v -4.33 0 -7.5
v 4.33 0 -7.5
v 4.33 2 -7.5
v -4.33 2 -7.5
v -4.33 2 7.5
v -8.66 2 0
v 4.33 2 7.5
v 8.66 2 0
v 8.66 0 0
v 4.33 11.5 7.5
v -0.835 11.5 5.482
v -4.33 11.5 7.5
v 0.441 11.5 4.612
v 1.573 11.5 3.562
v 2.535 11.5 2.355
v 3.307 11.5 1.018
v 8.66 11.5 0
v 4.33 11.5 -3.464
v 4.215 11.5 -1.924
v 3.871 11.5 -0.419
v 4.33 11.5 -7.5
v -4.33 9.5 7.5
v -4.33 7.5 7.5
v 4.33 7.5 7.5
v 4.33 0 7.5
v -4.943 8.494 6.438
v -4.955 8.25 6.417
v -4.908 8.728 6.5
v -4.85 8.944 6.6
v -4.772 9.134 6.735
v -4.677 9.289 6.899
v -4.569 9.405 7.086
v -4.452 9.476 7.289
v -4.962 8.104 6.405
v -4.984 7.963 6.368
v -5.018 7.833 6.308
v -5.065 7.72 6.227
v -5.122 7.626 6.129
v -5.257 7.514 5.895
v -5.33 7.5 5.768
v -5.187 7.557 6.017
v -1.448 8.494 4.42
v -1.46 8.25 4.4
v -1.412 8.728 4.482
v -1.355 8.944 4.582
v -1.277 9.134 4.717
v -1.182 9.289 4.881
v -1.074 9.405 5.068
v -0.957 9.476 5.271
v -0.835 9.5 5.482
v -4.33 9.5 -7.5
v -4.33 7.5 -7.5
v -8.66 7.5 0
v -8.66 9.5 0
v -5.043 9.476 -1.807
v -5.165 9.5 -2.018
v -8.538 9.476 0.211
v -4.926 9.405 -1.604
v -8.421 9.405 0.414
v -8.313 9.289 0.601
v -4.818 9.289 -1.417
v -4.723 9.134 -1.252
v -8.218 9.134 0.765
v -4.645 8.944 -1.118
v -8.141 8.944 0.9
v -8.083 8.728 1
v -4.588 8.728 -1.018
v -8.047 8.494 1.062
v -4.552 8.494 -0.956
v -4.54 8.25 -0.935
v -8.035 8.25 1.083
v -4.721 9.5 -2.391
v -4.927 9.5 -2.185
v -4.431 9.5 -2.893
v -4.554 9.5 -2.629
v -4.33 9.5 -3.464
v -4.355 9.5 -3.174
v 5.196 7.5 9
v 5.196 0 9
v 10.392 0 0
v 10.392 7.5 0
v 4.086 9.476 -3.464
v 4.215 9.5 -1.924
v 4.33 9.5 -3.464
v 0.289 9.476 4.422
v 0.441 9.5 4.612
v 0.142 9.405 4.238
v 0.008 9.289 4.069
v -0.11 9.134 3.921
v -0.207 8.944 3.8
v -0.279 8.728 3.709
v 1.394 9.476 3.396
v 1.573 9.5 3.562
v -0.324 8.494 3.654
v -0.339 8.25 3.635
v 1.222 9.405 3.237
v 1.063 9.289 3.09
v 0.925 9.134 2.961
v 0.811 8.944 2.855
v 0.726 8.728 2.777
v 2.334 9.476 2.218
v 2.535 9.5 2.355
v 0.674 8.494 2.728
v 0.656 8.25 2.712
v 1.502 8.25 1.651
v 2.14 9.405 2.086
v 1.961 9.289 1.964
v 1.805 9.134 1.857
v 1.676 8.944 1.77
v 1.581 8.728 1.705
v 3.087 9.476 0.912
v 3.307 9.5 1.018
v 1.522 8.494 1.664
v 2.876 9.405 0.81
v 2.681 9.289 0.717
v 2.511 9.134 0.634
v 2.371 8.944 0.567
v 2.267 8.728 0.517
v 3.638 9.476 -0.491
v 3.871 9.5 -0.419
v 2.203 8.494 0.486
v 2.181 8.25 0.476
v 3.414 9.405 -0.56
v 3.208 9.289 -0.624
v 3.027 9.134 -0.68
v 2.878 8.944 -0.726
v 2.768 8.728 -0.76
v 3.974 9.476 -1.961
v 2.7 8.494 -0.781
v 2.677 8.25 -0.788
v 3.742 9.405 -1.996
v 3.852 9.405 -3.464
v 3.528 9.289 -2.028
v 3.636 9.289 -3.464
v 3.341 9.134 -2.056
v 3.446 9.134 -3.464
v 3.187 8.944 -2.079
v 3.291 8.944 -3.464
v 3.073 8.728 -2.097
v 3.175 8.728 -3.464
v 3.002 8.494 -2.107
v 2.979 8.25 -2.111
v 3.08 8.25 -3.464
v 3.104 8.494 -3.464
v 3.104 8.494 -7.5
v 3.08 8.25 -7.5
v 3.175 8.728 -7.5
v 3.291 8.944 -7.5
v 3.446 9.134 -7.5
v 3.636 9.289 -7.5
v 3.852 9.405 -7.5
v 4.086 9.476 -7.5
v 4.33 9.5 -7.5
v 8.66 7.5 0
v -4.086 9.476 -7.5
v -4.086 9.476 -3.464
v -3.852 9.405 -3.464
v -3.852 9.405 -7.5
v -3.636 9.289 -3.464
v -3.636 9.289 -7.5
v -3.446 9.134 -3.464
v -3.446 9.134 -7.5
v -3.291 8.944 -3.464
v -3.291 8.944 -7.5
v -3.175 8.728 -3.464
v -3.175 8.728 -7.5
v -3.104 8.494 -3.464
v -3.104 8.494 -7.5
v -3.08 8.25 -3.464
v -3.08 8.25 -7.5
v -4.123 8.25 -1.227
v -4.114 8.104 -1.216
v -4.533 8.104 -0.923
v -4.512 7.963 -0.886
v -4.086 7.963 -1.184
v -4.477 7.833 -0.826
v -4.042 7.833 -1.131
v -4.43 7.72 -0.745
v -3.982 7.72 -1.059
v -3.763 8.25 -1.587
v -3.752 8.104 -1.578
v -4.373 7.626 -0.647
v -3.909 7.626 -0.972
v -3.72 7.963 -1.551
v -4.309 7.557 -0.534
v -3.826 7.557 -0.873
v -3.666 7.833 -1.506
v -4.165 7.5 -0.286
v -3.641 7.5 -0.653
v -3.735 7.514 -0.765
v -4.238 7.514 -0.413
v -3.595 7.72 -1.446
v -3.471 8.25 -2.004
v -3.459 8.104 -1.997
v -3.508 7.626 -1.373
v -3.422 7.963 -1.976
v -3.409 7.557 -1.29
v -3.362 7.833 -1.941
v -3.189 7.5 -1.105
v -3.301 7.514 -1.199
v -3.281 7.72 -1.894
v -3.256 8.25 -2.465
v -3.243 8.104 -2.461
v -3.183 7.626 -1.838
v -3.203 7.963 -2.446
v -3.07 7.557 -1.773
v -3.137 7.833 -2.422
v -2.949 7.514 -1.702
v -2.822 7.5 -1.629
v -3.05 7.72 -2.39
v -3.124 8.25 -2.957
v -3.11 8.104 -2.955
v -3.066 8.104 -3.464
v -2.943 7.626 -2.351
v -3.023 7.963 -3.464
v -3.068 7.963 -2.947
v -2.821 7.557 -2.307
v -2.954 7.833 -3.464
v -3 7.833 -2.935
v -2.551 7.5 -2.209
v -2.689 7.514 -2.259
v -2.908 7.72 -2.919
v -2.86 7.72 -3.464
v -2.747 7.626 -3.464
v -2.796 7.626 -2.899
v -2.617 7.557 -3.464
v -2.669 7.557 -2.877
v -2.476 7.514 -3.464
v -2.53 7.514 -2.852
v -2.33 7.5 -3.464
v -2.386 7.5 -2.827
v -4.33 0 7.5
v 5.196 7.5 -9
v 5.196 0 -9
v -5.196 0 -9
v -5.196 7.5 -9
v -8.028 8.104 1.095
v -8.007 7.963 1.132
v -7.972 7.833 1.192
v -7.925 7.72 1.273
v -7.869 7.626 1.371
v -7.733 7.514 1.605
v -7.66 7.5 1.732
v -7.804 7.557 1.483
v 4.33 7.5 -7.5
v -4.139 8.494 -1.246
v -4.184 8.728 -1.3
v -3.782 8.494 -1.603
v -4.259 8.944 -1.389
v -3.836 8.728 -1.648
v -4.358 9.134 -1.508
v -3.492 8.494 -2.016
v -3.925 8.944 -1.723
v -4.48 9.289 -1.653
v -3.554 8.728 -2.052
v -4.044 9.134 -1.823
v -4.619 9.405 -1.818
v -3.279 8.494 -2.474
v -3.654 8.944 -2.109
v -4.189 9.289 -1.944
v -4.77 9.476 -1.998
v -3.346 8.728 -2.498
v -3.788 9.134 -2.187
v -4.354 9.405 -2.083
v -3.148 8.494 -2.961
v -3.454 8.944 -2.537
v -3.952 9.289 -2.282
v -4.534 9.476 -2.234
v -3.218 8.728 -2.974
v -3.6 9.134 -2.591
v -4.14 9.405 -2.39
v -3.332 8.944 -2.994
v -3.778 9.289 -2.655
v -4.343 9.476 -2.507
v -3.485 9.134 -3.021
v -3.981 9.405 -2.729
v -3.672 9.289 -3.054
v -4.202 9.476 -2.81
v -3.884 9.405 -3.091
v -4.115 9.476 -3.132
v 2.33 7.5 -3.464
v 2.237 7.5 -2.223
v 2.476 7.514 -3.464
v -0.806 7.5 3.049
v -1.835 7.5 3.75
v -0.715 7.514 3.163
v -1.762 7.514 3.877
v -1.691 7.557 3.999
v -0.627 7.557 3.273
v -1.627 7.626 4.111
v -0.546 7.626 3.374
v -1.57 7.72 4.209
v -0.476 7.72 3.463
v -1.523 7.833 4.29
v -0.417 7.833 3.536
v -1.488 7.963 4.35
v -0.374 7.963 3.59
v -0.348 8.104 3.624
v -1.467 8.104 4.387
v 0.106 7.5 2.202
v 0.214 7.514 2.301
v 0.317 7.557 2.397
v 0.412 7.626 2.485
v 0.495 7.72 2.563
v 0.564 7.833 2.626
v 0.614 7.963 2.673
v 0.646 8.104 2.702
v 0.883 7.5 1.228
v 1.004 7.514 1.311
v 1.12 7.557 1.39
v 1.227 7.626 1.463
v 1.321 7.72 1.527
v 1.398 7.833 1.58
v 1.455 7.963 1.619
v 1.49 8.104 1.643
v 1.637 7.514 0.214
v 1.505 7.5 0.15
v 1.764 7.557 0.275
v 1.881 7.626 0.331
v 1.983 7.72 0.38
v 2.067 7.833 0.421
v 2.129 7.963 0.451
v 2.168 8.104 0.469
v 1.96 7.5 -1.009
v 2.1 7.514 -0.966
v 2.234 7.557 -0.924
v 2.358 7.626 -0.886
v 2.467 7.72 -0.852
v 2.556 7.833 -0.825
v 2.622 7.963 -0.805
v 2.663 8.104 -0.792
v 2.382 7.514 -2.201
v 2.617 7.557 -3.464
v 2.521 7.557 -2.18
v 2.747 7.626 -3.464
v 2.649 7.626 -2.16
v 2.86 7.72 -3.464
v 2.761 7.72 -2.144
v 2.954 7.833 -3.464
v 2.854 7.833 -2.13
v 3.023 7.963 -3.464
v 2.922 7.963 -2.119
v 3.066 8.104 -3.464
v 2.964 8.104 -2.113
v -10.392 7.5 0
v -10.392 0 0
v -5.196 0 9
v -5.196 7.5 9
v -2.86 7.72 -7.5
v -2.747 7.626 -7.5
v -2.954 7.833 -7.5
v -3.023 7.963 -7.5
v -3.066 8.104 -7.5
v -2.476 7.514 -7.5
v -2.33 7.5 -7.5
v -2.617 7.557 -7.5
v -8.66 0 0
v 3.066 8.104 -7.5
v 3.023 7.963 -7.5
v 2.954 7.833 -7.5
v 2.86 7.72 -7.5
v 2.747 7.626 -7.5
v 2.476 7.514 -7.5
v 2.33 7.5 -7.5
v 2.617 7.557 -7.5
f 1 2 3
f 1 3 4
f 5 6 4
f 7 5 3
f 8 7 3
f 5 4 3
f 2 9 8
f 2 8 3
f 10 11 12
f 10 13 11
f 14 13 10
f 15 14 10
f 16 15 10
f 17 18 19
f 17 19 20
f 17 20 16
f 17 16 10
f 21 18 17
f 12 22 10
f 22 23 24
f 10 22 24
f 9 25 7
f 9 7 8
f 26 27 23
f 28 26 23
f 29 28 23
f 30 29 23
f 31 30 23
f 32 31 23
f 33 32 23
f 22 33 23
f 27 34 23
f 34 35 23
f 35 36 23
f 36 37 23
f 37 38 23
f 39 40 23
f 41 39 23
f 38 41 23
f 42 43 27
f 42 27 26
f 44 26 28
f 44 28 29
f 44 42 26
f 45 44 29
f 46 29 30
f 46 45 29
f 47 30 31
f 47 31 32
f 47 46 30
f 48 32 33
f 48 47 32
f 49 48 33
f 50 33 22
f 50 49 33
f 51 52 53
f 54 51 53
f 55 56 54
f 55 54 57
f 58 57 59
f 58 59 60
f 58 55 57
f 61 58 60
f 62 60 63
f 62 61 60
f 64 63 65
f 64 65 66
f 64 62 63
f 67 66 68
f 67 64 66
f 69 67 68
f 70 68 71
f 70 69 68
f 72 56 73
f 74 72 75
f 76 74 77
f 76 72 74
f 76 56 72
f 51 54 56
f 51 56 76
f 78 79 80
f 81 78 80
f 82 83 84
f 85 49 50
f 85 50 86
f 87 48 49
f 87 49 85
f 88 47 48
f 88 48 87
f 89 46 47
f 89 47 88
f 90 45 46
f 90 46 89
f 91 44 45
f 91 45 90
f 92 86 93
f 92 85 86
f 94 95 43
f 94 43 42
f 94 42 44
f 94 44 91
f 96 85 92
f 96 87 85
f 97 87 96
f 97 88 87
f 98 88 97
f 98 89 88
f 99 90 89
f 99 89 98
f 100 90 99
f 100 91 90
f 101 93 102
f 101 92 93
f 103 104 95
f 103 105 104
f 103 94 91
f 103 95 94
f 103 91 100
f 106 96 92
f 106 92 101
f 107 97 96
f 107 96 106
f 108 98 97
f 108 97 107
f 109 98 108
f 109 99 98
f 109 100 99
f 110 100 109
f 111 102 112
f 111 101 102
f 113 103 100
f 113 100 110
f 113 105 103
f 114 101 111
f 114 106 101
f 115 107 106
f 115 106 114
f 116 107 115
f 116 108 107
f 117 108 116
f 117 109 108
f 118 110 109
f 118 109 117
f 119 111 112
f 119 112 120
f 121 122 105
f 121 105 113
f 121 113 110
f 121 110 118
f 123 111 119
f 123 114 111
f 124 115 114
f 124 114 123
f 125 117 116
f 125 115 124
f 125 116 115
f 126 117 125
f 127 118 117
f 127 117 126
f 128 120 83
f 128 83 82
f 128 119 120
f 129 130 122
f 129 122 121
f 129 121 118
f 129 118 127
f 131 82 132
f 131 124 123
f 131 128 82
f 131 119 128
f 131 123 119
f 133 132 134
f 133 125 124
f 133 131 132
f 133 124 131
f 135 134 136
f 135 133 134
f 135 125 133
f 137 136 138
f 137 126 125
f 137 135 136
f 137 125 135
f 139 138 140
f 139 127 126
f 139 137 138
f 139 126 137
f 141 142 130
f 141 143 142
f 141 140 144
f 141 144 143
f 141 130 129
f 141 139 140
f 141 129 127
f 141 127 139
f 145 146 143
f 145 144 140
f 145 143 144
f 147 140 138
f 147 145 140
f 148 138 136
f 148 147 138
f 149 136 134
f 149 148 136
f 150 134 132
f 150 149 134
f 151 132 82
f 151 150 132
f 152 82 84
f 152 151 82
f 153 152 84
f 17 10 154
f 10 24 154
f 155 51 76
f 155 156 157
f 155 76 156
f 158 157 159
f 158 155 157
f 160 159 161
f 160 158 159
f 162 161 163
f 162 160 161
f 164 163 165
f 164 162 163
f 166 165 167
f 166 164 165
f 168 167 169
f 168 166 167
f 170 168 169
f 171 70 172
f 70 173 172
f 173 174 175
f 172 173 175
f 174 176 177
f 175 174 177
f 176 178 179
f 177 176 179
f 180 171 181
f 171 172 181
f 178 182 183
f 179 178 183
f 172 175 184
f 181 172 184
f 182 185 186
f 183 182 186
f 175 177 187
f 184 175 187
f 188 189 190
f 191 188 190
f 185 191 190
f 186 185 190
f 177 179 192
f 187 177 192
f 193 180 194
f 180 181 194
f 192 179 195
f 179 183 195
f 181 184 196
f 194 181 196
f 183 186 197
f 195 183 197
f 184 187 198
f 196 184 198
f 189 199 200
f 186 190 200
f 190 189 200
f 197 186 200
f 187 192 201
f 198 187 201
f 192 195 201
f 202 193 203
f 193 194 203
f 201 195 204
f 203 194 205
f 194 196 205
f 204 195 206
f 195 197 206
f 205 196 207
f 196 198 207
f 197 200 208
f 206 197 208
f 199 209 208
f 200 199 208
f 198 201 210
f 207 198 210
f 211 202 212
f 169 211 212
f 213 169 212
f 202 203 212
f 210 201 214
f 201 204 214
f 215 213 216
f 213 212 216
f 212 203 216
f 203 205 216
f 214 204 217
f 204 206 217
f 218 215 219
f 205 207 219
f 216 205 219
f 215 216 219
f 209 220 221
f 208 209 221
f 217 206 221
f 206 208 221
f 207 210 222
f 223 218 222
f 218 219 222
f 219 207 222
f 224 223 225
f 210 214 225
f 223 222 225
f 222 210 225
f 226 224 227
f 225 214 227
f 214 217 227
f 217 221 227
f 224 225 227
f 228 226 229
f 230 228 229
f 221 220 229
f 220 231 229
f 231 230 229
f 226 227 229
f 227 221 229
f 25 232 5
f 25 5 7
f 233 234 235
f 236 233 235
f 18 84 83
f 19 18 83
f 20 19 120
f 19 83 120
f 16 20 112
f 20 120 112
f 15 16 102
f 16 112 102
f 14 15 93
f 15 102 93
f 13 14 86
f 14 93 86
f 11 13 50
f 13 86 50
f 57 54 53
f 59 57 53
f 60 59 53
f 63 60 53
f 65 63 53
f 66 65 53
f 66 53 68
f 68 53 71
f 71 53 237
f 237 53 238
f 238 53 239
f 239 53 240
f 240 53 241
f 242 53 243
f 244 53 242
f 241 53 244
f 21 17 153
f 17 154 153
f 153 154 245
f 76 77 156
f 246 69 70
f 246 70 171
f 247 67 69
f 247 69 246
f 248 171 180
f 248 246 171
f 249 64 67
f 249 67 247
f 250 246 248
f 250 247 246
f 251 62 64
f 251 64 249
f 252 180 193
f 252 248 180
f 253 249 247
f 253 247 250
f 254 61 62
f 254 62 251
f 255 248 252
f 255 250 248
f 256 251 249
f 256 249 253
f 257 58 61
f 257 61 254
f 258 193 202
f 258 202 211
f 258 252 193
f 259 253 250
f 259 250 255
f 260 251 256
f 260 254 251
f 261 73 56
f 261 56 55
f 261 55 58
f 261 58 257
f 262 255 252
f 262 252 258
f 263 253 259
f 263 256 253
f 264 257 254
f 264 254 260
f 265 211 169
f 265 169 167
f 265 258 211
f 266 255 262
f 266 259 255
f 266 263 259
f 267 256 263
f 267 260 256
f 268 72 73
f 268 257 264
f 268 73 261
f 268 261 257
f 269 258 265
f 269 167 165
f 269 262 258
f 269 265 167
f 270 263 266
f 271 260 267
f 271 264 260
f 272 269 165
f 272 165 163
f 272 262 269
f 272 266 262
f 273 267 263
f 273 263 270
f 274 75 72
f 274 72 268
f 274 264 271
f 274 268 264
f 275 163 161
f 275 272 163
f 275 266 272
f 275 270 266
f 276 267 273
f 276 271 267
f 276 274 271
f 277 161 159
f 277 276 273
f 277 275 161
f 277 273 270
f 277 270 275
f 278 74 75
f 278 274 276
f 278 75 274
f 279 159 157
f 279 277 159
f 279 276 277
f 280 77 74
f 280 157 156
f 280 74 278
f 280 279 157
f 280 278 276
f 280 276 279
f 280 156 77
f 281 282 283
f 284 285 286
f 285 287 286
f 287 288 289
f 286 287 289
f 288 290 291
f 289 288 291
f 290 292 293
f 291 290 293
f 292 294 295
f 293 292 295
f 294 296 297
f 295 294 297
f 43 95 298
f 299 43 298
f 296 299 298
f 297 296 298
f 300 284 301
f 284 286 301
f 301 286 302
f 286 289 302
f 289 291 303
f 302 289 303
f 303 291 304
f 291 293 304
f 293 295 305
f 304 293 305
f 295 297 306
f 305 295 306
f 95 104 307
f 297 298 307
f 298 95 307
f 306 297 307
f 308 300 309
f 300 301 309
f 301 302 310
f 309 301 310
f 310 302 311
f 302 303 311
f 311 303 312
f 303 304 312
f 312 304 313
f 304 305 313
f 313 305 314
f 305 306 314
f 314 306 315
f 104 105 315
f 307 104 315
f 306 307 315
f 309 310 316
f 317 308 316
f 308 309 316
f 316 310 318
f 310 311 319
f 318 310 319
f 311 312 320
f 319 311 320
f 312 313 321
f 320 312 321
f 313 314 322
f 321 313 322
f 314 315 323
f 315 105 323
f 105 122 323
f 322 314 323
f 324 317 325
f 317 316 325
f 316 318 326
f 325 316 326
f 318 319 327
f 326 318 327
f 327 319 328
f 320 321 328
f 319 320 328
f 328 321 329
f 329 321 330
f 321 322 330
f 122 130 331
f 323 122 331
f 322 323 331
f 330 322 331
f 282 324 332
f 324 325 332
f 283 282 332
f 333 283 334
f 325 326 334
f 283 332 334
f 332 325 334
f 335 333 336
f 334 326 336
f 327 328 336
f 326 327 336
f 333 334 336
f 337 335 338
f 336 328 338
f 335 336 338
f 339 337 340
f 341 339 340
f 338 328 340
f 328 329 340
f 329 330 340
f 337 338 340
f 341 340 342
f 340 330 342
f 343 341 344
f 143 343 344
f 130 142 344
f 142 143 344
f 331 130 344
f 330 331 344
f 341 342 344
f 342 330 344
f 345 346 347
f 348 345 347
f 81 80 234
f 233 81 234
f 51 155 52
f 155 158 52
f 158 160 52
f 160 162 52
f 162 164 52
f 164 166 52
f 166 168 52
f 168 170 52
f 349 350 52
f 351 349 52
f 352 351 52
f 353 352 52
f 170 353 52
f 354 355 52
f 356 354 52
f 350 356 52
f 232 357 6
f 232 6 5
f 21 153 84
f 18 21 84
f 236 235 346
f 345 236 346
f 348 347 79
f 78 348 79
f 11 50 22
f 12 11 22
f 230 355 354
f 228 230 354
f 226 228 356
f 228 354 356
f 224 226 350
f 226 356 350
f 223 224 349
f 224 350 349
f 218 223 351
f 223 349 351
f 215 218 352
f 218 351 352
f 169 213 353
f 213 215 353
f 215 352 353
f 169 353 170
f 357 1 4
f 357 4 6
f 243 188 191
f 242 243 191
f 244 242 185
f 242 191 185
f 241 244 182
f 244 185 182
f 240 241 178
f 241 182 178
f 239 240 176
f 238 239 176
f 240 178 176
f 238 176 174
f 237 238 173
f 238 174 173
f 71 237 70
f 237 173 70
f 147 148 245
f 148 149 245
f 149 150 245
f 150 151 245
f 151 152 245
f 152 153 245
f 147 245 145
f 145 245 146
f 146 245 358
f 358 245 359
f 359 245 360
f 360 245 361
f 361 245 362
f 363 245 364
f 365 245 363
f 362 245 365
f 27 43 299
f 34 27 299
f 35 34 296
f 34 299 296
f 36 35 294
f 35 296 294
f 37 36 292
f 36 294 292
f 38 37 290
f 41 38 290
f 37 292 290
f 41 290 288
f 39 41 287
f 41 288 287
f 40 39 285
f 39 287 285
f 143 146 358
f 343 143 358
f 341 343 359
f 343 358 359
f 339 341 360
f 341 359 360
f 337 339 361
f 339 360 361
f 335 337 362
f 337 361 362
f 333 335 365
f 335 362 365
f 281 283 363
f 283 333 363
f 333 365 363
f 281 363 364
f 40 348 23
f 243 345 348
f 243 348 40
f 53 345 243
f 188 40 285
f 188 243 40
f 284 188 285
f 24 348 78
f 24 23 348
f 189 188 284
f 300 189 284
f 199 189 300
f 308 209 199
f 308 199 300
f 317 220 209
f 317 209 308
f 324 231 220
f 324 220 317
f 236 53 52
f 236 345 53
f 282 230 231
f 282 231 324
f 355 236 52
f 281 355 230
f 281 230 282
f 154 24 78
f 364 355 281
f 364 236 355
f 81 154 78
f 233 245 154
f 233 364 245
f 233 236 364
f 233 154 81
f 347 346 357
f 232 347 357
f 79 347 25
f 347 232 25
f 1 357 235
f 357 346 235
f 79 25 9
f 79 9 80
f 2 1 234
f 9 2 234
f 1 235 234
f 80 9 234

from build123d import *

# Parameters (mm, degrees)
BOSS_EXTRUDE1_DEPTH = 7.5
CUT_EXTRUDE1_DEPTH  = 2
BOSS_EXTRUDE2_DEPTH = 2
BOSS_EXTRUDE3_DEPTH = 2


with BuildPart() as part:
    # Sketch1 → Boss-Extrude1 (new body)
    with BuildSketch(Plane(origin=(0, 0, 0), x_dir=(1, 0, 0), z_dir=(0, 1, 0))):
        Polygon((5.196152423, -9), (10.392304845, 0), (5.196152423, 9), (-5.196152423, 9), (-10.392304845, 0), (-5.196152423, -9), align=None)
    extrude(amount=BOSS_EXTRUDE1_DEPTH)

    # Sketch1<3> → Cut-Extrude1 (cut)
    with BuildSketch(Plane(origin=(0, 0, 0), x_dir=(1, 0, 0), z_dir=(0, 1, 0))):
        Polygon((4.330127019, -7.5), (8.660254038, 0), (4.330127019, 7.5), (-4.330127019, 7.5), (-8.660254038, 0), (-4.330127019, -7.5), align=None)
    extrude(amount=CUT_EXTRUDE1_DEPTH, mode=Mode.SUBTRACT)

    # Sketch4 → Boss-Extrude2 (add)
    with BuildSketch(Plane(origin=(0, 7.5, 0), x_dir=(1, 0, 0), z_dir=(0, 1, 0))):
        Polygon((8.660254038, 0), (4.330127019, 7.5), (-4.330127019, 7.5), (-8.660254038, 0), (-4.330127019, -7.5), (4.330127019, -7.5), align=None)
    extrude(amount=BOSS_EXTRUDE2_DEPTH)

    # Cut-Sweep3: sweep along a path in Sketch7
    with BuildLine(Plane(origin=(0, 9.5, 0), x_dir=(1, 0, 0), z_dir=(0, 1, 0))) as cut_sweep3_path:
        Line((-6.495190528, -3.75), (-3, -1.732050808))
        ThreePointArc((-3, -1.732050808), (-0.803847577, 0.464101615), (0, 3.464101615))
        Line((0, 3.464101615), (0, 7.5))
    # Sketch5 → Cut-Sweep3 (sweep, cut)
    with BuildSketch(Plane(origin=(-6.495190528, 0, 3.75), x_dir=(0.5000000000000006, 0, 0.8660254037844384), z_dir=(-0.8660254037844384, 0, 0.5000000000000006))):
        with BuildLine():
            Line((-4.330127019, 9.5), (4.330127019, 9.5))
            ThreePointArc((4.330127019, 9.5), (3.446243542, 9.133883476), (3.080127019, 8.25))
            ThreePointArc((3.080127019, 8.25), (2.860457105, 7.719669914), (2.330127019, 7.5))
            Line((2.330127019, 7.5), (-2.330127019, 7.5))
            ThreePointArc((-2.330127019, 7.5), (-2.860457105, 7.719669914), (-3.080127019, 8.25))
            ThreePointArc((-3.080127019, 8.25), (-3.446243542, 9.133883476), (-4.330127019, 9.5))
        make_face()
    sweep(path=cut_sweep3_path.line, mode=Mode.SUBTRACT)

    # Sketch8 → Boss-Extrude3 (add)
    with BuildSketch(Plane(origin=(0, 9.5, 0), x_dir=(1, 0, 0), z_dir=(0, 1, 0))):
        with BuildLine():
            Line((-0.834936491, -5.482050808), (-4.330127019, -7.5))
            Line((-4.330127019, -7.5), (4.330127019, -7.5))
            Line((4.330127019, -7.5), (8.660254038, 0))
            Line((8.660254038, 0), (4.330127019, 7.5))
            Line((4.330127019, 7.5), (4.330127019, 3.464101615))
            ThreePointArc((4.330127019, 3.464101615), (2.946152423, -1.700961894), (-0.834936491, -5.482050808))
        make_face()
    extrude(amount=BOSS_EXTRUDE3_DEPTH)


solid = part.part
